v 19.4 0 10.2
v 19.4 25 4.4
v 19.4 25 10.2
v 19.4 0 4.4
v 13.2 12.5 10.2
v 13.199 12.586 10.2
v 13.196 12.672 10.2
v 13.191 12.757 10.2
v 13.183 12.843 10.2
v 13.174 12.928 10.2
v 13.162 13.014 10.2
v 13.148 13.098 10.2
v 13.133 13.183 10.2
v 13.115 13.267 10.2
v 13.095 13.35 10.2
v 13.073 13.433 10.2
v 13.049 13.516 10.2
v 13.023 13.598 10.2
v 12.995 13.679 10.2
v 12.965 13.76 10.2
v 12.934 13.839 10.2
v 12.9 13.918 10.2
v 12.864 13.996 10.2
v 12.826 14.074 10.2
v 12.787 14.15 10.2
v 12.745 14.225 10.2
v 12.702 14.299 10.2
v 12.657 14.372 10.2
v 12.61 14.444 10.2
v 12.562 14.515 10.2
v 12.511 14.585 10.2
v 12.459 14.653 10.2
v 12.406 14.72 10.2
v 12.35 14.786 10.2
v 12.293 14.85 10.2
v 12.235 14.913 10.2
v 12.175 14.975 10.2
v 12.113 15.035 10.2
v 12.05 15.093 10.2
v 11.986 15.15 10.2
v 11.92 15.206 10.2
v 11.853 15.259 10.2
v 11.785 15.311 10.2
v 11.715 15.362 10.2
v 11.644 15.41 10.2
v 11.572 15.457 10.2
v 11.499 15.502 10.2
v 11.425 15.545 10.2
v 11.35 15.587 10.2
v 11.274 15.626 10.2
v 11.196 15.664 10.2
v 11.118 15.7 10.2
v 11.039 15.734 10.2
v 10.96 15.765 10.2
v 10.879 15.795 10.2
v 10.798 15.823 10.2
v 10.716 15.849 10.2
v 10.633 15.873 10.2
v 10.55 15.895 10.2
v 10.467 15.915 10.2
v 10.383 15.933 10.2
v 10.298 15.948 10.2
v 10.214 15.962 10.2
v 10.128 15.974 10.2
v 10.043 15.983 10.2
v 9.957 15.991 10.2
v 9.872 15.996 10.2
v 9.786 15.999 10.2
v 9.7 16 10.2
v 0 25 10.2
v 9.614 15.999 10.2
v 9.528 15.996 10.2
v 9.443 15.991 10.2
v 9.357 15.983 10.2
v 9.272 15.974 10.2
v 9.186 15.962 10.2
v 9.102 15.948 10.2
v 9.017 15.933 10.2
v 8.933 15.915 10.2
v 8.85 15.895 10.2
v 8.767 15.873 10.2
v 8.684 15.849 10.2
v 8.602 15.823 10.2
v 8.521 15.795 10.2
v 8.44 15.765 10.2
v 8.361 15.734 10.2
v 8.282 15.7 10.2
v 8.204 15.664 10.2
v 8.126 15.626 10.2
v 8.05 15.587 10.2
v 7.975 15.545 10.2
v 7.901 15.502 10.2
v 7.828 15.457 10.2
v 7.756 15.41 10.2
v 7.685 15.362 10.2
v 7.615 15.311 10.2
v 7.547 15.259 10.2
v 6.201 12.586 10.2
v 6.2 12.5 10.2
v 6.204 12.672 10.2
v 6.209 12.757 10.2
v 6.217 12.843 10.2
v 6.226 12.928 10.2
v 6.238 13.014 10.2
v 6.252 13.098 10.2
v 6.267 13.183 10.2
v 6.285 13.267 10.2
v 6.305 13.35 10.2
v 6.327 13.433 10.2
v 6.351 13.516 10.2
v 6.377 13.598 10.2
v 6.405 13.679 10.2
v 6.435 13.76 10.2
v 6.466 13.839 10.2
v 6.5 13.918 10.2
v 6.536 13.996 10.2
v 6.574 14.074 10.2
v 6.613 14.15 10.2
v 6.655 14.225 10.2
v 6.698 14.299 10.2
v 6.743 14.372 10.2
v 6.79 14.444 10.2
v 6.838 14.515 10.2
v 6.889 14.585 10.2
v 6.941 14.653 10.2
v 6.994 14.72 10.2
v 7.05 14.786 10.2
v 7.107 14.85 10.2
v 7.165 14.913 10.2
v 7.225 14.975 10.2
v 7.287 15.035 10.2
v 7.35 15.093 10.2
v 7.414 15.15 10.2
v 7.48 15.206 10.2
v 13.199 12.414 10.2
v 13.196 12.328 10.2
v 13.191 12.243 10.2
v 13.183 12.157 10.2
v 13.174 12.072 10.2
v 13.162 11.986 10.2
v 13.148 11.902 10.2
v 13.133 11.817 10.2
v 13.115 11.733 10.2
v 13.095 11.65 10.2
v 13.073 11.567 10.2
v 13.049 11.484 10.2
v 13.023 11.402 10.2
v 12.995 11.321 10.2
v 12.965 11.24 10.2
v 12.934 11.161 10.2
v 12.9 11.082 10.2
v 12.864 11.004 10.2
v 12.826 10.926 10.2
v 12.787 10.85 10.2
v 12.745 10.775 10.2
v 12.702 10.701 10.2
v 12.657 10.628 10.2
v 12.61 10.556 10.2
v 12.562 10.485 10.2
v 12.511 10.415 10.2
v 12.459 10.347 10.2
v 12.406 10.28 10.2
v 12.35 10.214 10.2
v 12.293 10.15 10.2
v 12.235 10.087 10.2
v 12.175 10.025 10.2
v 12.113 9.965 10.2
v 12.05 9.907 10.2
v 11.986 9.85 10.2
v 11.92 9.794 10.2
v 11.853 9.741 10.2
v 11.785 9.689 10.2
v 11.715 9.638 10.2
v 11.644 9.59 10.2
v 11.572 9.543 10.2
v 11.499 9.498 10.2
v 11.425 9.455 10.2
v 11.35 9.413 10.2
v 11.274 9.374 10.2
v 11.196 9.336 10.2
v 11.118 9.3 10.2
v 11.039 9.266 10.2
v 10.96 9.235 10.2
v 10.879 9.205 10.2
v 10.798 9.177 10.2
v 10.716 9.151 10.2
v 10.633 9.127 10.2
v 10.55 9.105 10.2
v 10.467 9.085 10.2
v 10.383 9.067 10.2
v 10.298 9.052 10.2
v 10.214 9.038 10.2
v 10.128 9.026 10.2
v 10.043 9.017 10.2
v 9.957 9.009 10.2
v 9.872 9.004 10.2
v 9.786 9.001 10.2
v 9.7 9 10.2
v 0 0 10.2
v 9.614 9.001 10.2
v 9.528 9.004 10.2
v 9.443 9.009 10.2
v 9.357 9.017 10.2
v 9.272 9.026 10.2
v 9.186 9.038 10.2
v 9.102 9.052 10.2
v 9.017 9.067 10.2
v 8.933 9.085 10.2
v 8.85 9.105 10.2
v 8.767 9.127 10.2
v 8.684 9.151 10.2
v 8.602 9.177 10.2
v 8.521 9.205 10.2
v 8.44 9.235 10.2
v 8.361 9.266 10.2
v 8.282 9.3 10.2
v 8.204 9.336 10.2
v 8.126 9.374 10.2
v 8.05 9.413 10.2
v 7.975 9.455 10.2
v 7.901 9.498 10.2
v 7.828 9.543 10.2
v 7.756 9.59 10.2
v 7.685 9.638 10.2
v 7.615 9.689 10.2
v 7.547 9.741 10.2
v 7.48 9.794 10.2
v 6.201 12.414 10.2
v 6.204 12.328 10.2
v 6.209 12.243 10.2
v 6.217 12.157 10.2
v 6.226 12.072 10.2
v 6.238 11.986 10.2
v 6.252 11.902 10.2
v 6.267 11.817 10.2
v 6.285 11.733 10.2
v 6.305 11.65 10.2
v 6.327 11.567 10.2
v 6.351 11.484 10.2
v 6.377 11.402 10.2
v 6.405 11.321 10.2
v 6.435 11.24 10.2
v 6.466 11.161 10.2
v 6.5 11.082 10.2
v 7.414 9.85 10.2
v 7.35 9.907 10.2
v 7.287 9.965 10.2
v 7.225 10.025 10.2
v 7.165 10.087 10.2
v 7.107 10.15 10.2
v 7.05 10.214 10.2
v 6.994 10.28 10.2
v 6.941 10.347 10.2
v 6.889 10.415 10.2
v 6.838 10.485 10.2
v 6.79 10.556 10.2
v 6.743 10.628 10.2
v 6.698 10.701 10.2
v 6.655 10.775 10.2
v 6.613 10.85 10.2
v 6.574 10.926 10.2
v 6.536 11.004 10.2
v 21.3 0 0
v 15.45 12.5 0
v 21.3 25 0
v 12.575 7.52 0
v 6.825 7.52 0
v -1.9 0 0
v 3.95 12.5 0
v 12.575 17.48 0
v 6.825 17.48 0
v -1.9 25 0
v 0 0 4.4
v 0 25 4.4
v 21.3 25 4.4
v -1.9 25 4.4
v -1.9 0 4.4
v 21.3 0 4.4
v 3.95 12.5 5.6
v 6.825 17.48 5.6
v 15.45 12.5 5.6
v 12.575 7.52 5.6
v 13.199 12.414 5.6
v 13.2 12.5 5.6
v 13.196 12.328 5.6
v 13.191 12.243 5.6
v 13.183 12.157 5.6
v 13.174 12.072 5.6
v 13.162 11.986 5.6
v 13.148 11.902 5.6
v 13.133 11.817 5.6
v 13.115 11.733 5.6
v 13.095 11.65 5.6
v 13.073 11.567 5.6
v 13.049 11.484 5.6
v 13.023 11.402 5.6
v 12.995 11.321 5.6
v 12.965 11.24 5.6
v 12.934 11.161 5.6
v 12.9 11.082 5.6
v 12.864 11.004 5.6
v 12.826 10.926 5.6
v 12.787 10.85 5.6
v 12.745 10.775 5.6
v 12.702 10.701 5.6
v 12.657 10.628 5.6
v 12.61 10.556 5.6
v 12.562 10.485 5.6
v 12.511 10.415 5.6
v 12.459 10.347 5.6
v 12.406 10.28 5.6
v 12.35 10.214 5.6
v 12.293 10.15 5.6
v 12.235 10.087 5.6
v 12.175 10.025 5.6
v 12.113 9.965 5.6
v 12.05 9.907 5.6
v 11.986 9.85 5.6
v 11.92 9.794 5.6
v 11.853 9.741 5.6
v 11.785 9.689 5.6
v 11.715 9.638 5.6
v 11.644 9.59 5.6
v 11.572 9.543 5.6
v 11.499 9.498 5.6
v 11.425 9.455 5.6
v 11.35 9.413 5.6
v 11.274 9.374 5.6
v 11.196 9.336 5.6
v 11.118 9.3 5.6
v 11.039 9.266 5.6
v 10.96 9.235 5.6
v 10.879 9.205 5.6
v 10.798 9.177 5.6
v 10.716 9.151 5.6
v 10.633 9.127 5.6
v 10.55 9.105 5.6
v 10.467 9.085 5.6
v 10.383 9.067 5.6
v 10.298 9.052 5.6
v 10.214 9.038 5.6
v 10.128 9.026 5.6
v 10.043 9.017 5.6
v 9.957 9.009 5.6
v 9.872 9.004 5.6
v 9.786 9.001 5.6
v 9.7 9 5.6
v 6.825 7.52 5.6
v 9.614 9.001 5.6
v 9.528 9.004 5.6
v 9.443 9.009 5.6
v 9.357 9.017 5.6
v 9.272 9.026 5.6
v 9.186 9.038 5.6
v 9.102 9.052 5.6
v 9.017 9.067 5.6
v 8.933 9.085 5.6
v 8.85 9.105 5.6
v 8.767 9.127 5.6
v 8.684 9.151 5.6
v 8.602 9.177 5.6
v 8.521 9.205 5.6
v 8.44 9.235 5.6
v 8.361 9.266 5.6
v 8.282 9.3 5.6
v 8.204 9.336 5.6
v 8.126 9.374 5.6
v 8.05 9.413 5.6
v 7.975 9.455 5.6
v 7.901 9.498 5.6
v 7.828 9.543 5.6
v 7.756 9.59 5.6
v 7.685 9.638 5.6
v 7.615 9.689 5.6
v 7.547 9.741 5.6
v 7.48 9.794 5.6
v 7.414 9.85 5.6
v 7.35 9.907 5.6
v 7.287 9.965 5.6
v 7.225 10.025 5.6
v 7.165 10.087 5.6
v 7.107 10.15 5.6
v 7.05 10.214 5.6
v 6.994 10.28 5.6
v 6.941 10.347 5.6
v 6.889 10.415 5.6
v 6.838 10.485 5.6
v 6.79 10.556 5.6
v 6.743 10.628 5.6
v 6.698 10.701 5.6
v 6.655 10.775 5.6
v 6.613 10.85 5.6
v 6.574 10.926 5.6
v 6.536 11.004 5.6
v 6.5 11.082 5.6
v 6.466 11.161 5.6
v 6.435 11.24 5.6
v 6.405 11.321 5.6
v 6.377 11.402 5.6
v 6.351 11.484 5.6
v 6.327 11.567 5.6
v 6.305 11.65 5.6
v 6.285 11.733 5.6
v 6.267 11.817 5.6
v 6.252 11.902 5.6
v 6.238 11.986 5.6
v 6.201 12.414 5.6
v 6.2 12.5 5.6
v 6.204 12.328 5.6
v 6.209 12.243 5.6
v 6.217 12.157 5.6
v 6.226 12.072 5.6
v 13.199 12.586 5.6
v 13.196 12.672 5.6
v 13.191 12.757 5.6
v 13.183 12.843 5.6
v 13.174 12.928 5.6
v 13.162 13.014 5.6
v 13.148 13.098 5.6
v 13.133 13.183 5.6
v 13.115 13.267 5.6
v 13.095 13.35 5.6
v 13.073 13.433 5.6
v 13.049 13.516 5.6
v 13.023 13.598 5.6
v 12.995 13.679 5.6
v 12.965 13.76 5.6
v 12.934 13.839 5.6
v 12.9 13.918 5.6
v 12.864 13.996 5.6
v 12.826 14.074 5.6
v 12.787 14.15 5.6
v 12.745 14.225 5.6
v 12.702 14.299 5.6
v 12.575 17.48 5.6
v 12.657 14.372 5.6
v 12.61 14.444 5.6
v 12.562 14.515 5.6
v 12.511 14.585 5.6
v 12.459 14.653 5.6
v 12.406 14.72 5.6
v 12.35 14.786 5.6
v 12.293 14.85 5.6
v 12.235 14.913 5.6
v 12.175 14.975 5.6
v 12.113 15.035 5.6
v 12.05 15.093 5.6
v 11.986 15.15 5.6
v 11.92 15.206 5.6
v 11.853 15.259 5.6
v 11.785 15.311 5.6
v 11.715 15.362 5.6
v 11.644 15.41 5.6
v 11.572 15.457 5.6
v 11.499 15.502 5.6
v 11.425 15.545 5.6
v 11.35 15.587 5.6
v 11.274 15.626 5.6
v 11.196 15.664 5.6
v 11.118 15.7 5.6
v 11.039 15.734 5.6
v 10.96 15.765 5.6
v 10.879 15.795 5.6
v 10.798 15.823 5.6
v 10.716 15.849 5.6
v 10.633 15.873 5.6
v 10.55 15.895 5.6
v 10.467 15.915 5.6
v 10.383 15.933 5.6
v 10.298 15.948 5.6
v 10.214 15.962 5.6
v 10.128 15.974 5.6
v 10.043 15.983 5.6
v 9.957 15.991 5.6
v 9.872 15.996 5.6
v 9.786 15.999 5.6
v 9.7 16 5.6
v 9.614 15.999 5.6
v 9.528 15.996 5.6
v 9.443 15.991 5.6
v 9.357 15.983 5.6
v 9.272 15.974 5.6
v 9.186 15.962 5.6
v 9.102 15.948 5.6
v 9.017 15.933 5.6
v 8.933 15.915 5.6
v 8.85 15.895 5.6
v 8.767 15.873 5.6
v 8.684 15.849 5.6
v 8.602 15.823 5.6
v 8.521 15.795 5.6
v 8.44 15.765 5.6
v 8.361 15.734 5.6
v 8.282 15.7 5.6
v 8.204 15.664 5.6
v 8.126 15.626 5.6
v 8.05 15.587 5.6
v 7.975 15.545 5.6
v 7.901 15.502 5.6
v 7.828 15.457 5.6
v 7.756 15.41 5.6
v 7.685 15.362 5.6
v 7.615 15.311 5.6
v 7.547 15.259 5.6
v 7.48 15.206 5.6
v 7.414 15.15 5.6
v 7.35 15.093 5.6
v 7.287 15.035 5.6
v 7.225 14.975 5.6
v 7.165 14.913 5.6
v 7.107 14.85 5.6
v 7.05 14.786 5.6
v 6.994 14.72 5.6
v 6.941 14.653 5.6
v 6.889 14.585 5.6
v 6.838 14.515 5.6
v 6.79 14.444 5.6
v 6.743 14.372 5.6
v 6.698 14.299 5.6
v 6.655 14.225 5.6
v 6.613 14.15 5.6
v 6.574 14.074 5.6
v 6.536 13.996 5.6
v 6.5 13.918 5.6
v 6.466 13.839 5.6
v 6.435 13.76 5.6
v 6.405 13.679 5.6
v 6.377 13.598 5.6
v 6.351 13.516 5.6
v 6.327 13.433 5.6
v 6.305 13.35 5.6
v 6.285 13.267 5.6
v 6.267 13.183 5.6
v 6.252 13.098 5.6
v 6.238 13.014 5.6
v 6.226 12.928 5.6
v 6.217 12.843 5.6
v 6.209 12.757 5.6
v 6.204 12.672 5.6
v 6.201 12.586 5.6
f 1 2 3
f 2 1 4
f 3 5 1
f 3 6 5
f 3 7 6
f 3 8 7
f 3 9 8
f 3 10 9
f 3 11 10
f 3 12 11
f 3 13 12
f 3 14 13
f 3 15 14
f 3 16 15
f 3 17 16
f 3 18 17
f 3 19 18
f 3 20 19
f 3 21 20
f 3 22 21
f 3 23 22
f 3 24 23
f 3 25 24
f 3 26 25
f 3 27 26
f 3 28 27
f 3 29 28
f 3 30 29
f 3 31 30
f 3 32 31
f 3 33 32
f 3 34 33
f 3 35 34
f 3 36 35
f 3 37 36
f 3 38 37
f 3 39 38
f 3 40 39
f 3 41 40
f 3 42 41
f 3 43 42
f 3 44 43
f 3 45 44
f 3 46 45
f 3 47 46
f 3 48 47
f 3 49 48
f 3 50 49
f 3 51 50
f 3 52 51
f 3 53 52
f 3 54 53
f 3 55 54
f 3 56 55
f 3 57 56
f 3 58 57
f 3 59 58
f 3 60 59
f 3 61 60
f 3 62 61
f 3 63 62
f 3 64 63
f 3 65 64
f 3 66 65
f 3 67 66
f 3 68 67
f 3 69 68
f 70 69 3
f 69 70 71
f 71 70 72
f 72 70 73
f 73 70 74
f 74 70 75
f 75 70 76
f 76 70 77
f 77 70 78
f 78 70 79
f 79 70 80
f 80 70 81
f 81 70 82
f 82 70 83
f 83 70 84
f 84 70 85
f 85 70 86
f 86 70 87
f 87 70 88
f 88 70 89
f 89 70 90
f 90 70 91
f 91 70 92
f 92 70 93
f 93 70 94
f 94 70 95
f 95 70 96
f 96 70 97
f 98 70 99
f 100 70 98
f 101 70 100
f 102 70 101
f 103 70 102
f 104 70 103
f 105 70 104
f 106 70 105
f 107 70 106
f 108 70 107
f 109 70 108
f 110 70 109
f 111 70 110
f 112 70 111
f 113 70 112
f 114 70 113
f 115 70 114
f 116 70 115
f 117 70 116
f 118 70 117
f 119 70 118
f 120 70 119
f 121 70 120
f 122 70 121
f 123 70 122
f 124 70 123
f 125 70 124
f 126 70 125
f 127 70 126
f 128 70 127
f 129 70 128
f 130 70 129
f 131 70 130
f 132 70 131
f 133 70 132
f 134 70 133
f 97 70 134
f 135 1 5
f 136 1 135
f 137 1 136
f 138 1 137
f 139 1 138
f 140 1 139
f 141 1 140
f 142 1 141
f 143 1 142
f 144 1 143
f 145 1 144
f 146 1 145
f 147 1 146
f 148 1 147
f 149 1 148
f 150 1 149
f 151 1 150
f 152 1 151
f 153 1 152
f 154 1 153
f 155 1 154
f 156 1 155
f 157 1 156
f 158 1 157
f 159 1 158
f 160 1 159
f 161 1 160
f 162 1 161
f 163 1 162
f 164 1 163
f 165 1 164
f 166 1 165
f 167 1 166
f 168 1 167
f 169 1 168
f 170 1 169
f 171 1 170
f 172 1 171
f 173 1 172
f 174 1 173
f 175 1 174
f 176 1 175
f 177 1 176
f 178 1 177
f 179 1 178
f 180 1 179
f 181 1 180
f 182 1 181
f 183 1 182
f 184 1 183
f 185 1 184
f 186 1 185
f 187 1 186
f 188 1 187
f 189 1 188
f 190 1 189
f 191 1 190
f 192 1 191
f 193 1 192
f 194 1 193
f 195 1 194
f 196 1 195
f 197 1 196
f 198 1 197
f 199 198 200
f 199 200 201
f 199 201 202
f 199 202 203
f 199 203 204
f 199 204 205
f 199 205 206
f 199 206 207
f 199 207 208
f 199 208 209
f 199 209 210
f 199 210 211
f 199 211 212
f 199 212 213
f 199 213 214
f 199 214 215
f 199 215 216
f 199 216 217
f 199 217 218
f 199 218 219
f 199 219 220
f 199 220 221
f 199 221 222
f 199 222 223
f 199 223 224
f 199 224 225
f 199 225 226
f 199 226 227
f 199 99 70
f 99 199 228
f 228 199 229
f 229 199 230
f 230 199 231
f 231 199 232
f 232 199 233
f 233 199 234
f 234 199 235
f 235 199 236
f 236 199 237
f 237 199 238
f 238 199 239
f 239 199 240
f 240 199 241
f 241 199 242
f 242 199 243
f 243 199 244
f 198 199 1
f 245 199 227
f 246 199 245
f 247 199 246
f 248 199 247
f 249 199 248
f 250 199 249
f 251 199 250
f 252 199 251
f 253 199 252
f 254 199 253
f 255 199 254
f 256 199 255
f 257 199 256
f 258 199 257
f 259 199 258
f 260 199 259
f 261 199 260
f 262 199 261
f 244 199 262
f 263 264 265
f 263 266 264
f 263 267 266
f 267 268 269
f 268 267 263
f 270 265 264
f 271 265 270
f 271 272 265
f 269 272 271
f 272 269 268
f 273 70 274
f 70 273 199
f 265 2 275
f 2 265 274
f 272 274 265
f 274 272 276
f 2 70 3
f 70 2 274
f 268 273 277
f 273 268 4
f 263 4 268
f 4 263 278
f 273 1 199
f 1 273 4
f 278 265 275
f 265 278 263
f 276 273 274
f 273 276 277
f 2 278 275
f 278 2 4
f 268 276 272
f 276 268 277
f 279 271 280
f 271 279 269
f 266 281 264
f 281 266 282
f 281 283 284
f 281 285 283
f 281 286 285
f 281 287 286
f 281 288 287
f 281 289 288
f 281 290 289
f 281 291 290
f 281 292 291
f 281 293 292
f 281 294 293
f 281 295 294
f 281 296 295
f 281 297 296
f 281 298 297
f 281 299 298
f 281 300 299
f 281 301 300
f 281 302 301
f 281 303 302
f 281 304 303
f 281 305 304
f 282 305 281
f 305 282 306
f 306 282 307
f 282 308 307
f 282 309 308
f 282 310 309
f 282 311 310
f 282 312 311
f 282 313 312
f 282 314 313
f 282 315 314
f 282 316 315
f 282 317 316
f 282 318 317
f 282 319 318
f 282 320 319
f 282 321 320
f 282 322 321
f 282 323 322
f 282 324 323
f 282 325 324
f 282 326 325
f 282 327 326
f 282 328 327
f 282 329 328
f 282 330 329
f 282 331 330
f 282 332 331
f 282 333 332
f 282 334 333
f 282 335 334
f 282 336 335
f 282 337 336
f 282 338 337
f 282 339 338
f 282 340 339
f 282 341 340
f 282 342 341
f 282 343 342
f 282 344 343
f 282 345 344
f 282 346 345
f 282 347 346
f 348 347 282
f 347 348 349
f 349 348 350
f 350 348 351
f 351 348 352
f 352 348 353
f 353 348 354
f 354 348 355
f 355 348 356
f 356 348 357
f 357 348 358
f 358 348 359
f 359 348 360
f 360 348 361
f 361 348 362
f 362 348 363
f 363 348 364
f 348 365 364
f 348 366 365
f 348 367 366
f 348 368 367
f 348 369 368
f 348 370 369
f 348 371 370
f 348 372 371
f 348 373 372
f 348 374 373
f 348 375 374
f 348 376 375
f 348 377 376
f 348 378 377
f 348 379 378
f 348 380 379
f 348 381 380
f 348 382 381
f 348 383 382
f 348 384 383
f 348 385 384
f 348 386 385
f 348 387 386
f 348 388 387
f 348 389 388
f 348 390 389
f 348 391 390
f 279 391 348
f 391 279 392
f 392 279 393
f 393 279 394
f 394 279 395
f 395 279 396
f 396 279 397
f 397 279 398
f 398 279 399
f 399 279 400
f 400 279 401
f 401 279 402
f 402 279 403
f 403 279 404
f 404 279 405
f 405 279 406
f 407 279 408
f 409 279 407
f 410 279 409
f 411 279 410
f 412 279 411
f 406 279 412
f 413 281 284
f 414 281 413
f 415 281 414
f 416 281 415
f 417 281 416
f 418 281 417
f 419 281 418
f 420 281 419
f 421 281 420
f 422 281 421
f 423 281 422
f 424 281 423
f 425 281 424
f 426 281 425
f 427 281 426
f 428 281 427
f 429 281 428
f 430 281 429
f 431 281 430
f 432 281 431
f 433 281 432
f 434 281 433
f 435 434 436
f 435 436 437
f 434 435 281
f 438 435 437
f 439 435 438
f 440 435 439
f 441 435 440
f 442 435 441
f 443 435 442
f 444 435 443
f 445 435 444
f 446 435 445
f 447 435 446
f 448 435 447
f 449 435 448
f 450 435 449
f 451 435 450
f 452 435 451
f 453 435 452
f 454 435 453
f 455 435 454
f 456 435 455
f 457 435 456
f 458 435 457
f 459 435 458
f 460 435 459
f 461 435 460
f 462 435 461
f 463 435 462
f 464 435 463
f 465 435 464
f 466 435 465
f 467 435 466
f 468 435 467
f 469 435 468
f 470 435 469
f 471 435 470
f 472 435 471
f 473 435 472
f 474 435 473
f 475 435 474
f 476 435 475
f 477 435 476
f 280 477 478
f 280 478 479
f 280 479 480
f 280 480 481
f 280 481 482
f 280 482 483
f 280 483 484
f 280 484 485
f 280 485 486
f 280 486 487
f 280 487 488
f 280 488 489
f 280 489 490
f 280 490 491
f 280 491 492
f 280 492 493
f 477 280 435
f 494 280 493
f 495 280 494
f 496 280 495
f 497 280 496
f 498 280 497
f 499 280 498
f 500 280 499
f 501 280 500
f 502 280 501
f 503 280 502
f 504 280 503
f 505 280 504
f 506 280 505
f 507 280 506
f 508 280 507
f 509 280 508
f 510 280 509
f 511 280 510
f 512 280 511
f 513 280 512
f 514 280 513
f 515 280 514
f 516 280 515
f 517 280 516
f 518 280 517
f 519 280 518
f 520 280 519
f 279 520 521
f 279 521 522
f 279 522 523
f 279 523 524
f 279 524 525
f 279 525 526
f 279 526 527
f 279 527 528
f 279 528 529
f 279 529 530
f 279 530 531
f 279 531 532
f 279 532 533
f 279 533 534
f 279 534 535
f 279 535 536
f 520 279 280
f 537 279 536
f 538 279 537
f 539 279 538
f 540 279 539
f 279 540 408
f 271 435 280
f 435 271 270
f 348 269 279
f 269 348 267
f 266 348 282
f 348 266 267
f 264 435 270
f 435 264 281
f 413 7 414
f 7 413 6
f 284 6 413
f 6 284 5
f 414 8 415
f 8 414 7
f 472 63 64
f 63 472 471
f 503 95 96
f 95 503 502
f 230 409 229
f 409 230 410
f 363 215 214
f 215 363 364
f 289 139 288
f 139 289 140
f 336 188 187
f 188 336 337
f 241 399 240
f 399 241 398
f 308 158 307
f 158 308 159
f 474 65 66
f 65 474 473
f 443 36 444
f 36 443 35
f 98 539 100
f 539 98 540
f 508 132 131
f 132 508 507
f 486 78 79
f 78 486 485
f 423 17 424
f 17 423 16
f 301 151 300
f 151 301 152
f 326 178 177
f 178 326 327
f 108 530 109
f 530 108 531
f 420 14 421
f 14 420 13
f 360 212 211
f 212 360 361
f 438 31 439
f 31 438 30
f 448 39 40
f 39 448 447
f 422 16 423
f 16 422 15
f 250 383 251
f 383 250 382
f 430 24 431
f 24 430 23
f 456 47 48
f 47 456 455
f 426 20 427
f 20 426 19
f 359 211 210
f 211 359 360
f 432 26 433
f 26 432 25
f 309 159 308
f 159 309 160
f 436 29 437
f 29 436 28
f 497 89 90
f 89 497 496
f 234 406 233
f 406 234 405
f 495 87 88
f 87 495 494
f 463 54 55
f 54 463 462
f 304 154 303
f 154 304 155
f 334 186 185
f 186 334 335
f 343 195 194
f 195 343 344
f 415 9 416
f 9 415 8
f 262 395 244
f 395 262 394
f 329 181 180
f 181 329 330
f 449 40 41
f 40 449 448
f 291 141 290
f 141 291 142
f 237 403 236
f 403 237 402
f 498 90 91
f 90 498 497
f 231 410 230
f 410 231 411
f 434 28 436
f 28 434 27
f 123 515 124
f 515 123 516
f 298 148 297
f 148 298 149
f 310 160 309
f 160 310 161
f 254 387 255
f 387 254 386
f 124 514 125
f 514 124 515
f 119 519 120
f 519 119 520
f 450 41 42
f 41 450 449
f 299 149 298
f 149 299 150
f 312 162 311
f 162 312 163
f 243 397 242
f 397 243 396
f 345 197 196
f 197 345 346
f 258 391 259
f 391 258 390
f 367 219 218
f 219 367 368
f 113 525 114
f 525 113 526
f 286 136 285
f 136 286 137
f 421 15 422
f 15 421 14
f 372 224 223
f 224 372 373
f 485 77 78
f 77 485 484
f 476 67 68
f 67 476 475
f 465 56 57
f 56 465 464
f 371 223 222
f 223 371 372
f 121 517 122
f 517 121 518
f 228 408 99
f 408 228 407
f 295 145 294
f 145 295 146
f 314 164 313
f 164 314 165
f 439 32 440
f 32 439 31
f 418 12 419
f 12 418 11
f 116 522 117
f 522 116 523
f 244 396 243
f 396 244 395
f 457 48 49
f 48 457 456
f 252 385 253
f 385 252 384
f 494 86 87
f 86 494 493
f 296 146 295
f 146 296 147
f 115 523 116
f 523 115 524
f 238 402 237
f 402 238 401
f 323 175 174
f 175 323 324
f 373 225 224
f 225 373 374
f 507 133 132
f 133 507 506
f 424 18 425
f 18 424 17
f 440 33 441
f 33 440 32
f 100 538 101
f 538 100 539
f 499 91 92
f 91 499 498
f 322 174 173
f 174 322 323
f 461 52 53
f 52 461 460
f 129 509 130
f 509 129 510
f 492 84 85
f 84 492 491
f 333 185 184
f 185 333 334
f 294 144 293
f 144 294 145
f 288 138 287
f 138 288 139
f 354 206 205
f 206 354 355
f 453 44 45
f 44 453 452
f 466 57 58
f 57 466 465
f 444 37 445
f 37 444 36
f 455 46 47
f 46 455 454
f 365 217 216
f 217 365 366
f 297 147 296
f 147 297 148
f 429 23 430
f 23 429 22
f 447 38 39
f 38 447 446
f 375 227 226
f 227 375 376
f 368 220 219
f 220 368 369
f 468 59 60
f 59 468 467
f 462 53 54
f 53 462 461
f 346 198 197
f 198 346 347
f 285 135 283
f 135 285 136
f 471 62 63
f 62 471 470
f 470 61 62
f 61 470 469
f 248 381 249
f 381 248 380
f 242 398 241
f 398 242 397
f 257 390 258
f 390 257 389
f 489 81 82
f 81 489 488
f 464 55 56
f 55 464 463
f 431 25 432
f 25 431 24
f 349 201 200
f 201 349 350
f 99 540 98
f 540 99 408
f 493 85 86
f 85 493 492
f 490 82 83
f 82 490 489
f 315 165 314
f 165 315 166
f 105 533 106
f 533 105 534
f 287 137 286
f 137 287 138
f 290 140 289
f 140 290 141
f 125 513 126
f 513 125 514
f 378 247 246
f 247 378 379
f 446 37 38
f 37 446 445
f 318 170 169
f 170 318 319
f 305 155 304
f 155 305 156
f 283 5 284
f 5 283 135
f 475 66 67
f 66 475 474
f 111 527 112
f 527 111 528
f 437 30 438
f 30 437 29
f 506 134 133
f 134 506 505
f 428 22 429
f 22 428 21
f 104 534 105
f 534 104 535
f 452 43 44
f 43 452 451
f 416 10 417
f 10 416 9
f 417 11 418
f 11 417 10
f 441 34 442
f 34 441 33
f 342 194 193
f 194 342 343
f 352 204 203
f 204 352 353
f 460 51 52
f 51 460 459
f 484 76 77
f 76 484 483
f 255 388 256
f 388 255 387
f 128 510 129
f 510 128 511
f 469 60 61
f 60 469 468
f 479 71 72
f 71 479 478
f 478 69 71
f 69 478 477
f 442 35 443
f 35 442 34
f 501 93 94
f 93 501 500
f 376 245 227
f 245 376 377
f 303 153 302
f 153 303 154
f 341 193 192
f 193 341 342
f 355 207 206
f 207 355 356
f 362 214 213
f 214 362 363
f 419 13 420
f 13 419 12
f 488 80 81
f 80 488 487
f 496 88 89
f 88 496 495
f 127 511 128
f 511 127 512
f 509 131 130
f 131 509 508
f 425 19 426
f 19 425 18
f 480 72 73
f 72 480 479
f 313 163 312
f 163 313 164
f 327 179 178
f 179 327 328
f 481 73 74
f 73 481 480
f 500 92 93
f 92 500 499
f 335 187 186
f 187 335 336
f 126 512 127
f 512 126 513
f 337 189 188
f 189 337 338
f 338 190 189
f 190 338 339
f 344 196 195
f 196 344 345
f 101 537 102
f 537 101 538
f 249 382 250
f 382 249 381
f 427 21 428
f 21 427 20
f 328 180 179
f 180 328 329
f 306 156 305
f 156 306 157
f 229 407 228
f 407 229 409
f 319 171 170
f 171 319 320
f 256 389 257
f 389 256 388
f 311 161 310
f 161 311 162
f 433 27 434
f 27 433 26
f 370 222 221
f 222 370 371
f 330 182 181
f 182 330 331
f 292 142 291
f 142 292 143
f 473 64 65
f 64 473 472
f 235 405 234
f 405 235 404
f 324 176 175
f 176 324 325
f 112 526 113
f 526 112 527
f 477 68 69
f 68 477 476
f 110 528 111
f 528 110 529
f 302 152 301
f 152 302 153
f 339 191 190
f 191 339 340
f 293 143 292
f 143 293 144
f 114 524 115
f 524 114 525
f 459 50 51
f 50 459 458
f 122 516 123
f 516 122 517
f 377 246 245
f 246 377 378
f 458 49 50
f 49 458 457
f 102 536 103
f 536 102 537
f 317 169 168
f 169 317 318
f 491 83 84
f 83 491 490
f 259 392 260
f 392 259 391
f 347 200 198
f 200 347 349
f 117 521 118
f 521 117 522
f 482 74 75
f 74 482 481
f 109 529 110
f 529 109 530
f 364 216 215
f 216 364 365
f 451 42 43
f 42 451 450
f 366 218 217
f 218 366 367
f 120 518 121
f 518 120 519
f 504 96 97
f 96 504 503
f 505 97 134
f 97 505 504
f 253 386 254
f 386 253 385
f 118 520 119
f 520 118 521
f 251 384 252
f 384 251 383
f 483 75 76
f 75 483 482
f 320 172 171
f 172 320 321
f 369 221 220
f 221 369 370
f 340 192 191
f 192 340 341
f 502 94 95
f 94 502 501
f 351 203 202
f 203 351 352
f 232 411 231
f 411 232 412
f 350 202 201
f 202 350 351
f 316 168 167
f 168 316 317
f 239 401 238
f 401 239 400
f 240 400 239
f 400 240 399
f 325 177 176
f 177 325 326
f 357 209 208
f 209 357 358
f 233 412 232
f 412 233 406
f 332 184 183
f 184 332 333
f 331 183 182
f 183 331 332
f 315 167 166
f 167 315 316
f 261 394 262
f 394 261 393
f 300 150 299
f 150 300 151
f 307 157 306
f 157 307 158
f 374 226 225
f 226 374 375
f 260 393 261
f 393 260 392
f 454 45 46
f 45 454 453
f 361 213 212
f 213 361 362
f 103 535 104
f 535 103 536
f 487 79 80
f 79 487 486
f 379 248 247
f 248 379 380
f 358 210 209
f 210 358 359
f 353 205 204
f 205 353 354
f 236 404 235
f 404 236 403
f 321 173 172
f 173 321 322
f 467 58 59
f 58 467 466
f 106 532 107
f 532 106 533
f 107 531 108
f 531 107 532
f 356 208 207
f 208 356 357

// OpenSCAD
// file: ../library/screws.scad
module nut($diameter) {
    $fn = 6;
    linear_extrude(height = $diameter+1.1, convexity = 10, twist = 0)
    circle(d = $diameter);
}

module screwHole($diameter, $length = 40) {
    translate([0, 0, -2]) cylinder(h = $length, d = $diameter + 1);
}
// main file
include <../library/screws.scad>
$fn = 256;

innerWidth = 19.4;
outerWidth = 23.2;
lipHeight = 5.8;
height = 10.2;

length = 25;

screwDiameter = 6;

difference() {
	union() {
		cube([innerWidth, length, height]);

		translate([-(outerWidth - innerWidth) / 2, 0, 0])
		cube([outerWidth, length, height - lipHeight]);
	}

	translate([innerWidth/2, length/2, -7]) {
		nut((screwDiameter * 2) - 0.5);
		screwHole(screwDiameter);
	}
}
